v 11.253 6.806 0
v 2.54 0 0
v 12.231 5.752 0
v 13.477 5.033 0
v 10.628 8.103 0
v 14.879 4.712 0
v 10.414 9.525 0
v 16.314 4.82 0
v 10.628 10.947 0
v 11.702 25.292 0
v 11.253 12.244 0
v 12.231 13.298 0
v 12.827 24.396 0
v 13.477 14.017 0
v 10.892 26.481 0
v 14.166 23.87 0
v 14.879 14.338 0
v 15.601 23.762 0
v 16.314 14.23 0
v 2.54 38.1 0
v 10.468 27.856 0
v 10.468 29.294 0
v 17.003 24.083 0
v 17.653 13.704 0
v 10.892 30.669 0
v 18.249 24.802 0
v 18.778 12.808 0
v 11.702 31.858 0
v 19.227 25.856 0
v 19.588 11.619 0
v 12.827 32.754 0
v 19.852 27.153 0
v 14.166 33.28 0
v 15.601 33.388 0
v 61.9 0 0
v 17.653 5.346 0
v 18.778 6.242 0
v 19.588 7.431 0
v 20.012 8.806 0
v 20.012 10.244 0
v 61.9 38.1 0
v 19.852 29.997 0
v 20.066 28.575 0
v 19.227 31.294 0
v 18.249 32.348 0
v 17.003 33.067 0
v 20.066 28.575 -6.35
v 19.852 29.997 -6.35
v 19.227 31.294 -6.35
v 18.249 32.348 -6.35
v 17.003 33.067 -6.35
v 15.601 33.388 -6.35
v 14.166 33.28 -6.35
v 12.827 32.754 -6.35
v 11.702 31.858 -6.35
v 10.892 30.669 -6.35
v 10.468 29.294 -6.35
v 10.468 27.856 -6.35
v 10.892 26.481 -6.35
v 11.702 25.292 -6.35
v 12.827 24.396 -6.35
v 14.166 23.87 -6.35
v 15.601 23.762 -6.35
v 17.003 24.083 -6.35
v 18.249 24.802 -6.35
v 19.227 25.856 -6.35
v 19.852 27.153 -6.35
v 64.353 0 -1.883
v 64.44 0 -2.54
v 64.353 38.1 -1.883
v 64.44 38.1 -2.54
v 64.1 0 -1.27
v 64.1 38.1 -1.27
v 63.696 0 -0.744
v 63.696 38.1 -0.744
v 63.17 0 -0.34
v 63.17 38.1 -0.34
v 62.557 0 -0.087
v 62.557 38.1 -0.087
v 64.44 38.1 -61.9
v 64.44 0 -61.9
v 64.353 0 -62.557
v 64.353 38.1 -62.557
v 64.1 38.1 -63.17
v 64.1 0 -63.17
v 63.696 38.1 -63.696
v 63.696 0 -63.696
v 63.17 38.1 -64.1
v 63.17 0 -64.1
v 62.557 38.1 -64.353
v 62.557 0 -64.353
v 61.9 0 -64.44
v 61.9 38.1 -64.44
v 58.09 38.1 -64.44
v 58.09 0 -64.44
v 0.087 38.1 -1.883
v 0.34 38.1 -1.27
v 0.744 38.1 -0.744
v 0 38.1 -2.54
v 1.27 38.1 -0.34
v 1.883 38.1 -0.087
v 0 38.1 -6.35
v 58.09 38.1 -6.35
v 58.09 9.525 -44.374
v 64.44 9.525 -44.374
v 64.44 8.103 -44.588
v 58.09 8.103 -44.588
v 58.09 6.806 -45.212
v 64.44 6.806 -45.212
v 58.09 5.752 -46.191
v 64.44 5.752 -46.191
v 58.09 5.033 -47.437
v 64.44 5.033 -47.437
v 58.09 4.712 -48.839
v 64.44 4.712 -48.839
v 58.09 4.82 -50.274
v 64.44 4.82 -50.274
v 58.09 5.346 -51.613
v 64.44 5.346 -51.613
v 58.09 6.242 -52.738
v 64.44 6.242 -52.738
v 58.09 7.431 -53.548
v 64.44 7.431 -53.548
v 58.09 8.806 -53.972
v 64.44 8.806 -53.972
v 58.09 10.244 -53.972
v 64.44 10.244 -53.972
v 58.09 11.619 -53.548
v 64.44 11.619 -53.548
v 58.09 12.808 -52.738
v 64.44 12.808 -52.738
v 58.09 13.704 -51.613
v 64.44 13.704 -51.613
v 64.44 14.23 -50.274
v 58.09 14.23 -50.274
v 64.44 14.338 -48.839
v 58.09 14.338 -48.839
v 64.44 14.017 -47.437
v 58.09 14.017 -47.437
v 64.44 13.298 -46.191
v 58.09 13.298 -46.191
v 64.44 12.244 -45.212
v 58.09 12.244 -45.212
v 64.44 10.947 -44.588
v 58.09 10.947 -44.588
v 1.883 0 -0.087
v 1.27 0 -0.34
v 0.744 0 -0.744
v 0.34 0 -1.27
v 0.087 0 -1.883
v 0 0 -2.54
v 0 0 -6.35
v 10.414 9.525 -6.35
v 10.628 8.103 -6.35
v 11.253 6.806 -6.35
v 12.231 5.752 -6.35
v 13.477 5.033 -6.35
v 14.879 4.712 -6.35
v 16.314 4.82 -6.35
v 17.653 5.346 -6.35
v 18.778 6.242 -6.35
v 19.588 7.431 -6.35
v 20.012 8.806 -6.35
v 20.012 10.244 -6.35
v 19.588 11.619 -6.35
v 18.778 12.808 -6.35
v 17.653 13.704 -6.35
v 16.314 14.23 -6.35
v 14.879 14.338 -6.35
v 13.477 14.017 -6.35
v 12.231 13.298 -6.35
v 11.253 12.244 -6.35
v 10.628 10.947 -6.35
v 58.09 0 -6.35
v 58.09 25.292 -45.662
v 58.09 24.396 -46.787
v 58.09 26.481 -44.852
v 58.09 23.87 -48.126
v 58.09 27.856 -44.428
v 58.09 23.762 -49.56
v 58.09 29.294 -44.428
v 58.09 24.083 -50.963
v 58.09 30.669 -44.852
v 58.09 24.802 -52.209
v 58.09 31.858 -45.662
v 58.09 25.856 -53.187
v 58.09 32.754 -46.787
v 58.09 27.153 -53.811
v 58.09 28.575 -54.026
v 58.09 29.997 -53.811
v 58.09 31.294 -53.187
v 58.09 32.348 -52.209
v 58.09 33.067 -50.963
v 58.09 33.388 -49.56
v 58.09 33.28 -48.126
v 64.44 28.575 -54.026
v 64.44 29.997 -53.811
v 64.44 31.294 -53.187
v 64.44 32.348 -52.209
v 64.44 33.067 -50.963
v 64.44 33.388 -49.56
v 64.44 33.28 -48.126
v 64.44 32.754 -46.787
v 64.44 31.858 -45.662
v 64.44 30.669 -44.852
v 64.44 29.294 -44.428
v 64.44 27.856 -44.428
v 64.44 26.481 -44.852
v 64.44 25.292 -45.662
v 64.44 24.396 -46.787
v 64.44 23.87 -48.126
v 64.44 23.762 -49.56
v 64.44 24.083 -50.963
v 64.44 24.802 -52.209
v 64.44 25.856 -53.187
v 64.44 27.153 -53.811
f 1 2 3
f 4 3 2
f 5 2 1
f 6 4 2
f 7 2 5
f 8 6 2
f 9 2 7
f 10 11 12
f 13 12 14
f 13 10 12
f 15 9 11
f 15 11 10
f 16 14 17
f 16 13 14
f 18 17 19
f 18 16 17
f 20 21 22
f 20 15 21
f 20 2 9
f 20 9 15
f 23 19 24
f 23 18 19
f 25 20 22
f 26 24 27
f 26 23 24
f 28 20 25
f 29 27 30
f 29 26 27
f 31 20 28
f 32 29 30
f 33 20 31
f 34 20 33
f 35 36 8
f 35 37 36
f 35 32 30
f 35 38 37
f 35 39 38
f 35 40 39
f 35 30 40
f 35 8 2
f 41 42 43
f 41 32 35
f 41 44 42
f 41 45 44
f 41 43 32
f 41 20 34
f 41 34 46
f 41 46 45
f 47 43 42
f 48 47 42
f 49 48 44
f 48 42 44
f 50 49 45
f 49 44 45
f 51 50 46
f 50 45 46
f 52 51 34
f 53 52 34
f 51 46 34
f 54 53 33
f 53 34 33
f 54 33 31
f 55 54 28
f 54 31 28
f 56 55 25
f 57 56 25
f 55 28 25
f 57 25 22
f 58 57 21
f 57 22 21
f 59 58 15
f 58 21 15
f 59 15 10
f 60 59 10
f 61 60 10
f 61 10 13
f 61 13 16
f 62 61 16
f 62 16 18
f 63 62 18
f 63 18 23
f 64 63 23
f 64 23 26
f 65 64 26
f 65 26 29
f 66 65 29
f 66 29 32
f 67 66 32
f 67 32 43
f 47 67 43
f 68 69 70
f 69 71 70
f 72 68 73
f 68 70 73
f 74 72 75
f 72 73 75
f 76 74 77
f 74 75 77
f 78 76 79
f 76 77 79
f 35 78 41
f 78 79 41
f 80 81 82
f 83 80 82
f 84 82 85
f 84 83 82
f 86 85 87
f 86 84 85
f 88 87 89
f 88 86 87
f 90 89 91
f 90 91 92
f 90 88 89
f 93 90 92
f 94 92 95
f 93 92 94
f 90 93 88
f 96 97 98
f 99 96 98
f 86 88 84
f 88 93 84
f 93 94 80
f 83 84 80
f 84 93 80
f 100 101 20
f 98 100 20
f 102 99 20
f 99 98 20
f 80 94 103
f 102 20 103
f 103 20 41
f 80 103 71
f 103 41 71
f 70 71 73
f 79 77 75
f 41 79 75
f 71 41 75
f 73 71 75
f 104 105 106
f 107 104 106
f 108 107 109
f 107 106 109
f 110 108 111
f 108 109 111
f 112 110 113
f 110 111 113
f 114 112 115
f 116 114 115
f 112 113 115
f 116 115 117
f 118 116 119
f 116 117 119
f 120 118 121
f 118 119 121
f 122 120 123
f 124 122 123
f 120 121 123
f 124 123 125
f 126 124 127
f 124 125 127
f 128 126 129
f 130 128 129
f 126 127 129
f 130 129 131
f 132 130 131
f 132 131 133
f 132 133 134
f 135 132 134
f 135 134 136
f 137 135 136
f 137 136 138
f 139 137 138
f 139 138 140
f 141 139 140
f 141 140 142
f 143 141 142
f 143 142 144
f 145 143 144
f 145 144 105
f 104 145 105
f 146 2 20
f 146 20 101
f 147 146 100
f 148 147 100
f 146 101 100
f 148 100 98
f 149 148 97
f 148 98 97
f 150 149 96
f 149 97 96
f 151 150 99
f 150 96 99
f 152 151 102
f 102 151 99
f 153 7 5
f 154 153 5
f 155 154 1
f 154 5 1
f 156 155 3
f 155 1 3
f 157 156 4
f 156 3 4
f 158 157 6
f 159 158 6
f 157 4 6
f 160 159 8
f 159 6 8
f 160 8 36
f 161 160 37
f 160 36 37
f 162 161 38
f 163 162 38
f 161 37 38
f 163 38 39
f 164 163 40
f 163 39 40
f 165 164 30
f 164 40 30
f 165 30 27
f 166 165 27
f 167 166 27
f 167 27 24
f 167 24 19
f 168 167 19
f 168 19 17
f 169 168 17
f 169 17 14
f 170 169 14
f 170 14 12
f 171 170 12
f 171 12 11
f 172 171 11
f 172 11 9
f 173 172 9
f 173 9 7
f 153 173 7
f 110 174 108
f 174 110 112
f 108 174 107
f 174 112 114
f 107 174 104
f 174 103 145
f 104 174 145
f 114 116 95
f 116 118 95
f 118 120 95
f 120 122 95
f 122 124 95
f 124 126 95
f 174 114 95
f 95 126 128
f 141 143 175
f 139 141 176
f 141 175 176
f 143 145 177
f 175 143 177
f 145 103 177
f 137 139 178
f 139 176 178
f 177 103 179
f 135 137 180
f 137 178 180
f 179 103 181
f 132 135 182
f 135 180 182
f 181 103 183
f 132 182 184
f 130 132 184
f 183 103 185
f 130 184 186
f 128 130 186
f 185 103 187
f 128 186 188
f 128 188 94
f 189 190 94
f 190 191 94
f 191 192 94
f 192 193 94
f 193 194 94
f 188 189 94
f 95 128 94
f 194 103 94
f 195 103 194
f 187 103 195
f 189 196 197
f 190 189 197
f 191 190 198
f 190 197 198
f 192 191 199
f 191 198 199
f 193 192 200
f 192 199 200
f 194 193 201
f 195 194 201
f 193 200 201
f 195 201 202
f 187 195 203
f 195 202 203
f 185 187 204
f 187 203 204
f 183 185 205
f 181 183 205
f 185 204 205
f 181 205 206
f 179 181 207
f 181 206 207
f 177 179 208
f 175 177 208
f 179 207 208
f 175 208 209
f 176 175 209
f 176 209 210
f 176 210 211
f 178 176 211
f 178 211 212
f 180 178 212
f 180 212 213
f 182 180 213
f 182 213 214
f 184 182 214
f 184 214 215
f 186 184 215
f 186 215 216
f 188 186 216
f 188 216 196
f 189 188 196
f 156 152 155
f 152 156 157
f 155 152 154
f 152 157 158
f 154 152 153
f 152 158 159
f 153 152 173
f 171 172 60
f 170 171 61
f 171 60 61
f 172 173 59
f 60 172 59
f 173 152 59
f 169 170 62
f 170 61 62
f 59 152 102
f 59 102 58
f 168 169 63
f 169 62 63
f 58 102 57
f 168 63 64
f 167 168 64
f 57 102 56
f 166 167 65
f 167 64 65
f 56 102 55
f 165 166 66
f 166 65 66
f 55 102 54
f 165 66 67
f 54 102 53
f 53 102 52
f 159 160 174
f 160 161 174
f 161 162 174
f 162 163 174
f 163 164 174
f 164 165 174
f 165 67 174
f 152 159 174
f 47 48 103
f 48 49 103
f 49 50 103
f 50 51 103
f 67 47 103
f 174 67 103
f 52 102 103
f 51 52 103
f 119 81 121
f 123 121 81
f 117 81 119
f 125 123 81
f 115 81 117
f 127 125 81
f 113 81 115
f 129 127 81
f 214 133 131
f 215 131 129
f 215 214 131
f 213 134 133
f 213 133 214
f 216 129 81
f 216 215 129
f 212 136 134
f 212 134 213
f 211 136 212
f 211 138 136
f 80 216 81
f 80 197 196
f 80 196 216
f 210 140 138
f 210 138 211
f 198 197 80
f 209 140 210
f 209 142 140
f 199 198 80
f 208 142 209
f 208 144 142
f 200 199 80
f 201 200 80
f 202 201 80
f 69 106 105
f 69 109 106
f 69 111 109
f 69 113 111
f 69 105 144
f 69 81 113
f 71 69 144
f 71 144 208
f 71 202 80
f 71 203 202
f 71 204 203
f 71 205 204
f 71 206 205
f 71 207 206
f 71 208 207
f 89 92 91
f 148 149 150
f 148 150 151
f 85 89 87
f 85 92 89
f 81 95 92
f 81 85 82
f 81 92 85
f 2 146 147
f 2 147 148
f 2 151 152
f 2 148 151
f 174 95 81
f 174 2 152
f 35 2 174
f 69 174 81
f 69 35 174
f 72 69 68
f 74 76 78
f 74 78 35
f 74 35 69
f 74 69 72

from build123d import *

# Parameters (mm, degrees)
SKETCH1_W           = 64.4398
SKETCH1_H           = 38.1
BOSS_EXTRUDE1_DEPTH = 6.35
SKETCH2_W           = 64.4398
SKETCH2_H           = 38.1
BOSS_EXTRUDE2_DEPTH = 6.35
SKETCH3_R           = 4.826
CUT_EXTRUDE1_DEPTH  = 99.775430387
SKETCH4_R           = 4.826
CUT_EXTRUDE4_DEPTH  = 99.775430387
FILLET1_R           = 2.54
FILLET2_R           = 2.54
FILLET3_R           = 2.54


with BuildPart() as part:
    # Sketch1 → Boss-Extrude1 (new body)
    with BuildSketch(Plane.XY):
        with Locations((32.2199, 19.05)):
            Rectangle(SKETCH1_W, SKETCH1_H)
    extrude(amount=-BOSS_EXTRUDE1_DEPTH)

    # Sketch2 → Boss-Extrude2 (add)
    with BuildSketch(Plane(origin=(64.4398, 0, 0), x_dir=(0, 0, -1), z_dir=(1, 0, 0))):
        with Locations((32.2199, 19.05)):
            Rectangle(SKETCH2_W, SKETCH2_H)
    extrude(amount=-BOSS_EXTRUDE2_DEPTH)

    # Sketch3 → Cut-Extrude1 (cut, through all)
    with BuildSketch(Plane(origin=(64.4398, 0, 0), x_dir=(0, 0, -1), z_dir=(1, 0, 0))):
        with Locations((49.1998, 28.575)):
            Circle(SKETCH3_R)
        with Locations(Location((49.1998, 9.525, 0), (0, 0, 180))):
            Circle(SKETCH3_R)
    extrude(amount=-CUT_EXTRUDE1_DEPTH, mode=Mode.SUBTRACT)

    # Sketch4 → Cut-Extrude4 (cut, through all)
    with BuildSketch(Plane.XY):
        with Locations((15.24, 28.575)):
            Circle(SKETCH4_R)
        with Locations(Location((15.24, 9.525, 0), (0, 0, 180))):
            Circle(SKETCH4_R)
    extrude(amount=-CUT_EXTRUDE4_DEPTH, mode=Mode.SUBTRACT)

    # Fillet1
    fillet1_edges = [part.edges().sort_by_distance(p)[0] for p in [
        (0, 19.05, 0),
    ]]
    fillet(fillet1_edges, radius=FILLET1_R)

    # Fillet2
    fillet2_edges = [part.edges().sort_by_distance(p)[0] for p in [
        (64.4398, 19.05, -64.4398),
    ]]
    fillet(fillet2_edges, radius=FILLET2_R)

    # Fillet3
    fillet3_edges = [part.edges().sort_by_distance(p)[0] for p in [
        (64.4398, 19.05, 0),
    ]]
    fillet(fillet3_edges, radius=FILLET3_R)


solid = part.part
